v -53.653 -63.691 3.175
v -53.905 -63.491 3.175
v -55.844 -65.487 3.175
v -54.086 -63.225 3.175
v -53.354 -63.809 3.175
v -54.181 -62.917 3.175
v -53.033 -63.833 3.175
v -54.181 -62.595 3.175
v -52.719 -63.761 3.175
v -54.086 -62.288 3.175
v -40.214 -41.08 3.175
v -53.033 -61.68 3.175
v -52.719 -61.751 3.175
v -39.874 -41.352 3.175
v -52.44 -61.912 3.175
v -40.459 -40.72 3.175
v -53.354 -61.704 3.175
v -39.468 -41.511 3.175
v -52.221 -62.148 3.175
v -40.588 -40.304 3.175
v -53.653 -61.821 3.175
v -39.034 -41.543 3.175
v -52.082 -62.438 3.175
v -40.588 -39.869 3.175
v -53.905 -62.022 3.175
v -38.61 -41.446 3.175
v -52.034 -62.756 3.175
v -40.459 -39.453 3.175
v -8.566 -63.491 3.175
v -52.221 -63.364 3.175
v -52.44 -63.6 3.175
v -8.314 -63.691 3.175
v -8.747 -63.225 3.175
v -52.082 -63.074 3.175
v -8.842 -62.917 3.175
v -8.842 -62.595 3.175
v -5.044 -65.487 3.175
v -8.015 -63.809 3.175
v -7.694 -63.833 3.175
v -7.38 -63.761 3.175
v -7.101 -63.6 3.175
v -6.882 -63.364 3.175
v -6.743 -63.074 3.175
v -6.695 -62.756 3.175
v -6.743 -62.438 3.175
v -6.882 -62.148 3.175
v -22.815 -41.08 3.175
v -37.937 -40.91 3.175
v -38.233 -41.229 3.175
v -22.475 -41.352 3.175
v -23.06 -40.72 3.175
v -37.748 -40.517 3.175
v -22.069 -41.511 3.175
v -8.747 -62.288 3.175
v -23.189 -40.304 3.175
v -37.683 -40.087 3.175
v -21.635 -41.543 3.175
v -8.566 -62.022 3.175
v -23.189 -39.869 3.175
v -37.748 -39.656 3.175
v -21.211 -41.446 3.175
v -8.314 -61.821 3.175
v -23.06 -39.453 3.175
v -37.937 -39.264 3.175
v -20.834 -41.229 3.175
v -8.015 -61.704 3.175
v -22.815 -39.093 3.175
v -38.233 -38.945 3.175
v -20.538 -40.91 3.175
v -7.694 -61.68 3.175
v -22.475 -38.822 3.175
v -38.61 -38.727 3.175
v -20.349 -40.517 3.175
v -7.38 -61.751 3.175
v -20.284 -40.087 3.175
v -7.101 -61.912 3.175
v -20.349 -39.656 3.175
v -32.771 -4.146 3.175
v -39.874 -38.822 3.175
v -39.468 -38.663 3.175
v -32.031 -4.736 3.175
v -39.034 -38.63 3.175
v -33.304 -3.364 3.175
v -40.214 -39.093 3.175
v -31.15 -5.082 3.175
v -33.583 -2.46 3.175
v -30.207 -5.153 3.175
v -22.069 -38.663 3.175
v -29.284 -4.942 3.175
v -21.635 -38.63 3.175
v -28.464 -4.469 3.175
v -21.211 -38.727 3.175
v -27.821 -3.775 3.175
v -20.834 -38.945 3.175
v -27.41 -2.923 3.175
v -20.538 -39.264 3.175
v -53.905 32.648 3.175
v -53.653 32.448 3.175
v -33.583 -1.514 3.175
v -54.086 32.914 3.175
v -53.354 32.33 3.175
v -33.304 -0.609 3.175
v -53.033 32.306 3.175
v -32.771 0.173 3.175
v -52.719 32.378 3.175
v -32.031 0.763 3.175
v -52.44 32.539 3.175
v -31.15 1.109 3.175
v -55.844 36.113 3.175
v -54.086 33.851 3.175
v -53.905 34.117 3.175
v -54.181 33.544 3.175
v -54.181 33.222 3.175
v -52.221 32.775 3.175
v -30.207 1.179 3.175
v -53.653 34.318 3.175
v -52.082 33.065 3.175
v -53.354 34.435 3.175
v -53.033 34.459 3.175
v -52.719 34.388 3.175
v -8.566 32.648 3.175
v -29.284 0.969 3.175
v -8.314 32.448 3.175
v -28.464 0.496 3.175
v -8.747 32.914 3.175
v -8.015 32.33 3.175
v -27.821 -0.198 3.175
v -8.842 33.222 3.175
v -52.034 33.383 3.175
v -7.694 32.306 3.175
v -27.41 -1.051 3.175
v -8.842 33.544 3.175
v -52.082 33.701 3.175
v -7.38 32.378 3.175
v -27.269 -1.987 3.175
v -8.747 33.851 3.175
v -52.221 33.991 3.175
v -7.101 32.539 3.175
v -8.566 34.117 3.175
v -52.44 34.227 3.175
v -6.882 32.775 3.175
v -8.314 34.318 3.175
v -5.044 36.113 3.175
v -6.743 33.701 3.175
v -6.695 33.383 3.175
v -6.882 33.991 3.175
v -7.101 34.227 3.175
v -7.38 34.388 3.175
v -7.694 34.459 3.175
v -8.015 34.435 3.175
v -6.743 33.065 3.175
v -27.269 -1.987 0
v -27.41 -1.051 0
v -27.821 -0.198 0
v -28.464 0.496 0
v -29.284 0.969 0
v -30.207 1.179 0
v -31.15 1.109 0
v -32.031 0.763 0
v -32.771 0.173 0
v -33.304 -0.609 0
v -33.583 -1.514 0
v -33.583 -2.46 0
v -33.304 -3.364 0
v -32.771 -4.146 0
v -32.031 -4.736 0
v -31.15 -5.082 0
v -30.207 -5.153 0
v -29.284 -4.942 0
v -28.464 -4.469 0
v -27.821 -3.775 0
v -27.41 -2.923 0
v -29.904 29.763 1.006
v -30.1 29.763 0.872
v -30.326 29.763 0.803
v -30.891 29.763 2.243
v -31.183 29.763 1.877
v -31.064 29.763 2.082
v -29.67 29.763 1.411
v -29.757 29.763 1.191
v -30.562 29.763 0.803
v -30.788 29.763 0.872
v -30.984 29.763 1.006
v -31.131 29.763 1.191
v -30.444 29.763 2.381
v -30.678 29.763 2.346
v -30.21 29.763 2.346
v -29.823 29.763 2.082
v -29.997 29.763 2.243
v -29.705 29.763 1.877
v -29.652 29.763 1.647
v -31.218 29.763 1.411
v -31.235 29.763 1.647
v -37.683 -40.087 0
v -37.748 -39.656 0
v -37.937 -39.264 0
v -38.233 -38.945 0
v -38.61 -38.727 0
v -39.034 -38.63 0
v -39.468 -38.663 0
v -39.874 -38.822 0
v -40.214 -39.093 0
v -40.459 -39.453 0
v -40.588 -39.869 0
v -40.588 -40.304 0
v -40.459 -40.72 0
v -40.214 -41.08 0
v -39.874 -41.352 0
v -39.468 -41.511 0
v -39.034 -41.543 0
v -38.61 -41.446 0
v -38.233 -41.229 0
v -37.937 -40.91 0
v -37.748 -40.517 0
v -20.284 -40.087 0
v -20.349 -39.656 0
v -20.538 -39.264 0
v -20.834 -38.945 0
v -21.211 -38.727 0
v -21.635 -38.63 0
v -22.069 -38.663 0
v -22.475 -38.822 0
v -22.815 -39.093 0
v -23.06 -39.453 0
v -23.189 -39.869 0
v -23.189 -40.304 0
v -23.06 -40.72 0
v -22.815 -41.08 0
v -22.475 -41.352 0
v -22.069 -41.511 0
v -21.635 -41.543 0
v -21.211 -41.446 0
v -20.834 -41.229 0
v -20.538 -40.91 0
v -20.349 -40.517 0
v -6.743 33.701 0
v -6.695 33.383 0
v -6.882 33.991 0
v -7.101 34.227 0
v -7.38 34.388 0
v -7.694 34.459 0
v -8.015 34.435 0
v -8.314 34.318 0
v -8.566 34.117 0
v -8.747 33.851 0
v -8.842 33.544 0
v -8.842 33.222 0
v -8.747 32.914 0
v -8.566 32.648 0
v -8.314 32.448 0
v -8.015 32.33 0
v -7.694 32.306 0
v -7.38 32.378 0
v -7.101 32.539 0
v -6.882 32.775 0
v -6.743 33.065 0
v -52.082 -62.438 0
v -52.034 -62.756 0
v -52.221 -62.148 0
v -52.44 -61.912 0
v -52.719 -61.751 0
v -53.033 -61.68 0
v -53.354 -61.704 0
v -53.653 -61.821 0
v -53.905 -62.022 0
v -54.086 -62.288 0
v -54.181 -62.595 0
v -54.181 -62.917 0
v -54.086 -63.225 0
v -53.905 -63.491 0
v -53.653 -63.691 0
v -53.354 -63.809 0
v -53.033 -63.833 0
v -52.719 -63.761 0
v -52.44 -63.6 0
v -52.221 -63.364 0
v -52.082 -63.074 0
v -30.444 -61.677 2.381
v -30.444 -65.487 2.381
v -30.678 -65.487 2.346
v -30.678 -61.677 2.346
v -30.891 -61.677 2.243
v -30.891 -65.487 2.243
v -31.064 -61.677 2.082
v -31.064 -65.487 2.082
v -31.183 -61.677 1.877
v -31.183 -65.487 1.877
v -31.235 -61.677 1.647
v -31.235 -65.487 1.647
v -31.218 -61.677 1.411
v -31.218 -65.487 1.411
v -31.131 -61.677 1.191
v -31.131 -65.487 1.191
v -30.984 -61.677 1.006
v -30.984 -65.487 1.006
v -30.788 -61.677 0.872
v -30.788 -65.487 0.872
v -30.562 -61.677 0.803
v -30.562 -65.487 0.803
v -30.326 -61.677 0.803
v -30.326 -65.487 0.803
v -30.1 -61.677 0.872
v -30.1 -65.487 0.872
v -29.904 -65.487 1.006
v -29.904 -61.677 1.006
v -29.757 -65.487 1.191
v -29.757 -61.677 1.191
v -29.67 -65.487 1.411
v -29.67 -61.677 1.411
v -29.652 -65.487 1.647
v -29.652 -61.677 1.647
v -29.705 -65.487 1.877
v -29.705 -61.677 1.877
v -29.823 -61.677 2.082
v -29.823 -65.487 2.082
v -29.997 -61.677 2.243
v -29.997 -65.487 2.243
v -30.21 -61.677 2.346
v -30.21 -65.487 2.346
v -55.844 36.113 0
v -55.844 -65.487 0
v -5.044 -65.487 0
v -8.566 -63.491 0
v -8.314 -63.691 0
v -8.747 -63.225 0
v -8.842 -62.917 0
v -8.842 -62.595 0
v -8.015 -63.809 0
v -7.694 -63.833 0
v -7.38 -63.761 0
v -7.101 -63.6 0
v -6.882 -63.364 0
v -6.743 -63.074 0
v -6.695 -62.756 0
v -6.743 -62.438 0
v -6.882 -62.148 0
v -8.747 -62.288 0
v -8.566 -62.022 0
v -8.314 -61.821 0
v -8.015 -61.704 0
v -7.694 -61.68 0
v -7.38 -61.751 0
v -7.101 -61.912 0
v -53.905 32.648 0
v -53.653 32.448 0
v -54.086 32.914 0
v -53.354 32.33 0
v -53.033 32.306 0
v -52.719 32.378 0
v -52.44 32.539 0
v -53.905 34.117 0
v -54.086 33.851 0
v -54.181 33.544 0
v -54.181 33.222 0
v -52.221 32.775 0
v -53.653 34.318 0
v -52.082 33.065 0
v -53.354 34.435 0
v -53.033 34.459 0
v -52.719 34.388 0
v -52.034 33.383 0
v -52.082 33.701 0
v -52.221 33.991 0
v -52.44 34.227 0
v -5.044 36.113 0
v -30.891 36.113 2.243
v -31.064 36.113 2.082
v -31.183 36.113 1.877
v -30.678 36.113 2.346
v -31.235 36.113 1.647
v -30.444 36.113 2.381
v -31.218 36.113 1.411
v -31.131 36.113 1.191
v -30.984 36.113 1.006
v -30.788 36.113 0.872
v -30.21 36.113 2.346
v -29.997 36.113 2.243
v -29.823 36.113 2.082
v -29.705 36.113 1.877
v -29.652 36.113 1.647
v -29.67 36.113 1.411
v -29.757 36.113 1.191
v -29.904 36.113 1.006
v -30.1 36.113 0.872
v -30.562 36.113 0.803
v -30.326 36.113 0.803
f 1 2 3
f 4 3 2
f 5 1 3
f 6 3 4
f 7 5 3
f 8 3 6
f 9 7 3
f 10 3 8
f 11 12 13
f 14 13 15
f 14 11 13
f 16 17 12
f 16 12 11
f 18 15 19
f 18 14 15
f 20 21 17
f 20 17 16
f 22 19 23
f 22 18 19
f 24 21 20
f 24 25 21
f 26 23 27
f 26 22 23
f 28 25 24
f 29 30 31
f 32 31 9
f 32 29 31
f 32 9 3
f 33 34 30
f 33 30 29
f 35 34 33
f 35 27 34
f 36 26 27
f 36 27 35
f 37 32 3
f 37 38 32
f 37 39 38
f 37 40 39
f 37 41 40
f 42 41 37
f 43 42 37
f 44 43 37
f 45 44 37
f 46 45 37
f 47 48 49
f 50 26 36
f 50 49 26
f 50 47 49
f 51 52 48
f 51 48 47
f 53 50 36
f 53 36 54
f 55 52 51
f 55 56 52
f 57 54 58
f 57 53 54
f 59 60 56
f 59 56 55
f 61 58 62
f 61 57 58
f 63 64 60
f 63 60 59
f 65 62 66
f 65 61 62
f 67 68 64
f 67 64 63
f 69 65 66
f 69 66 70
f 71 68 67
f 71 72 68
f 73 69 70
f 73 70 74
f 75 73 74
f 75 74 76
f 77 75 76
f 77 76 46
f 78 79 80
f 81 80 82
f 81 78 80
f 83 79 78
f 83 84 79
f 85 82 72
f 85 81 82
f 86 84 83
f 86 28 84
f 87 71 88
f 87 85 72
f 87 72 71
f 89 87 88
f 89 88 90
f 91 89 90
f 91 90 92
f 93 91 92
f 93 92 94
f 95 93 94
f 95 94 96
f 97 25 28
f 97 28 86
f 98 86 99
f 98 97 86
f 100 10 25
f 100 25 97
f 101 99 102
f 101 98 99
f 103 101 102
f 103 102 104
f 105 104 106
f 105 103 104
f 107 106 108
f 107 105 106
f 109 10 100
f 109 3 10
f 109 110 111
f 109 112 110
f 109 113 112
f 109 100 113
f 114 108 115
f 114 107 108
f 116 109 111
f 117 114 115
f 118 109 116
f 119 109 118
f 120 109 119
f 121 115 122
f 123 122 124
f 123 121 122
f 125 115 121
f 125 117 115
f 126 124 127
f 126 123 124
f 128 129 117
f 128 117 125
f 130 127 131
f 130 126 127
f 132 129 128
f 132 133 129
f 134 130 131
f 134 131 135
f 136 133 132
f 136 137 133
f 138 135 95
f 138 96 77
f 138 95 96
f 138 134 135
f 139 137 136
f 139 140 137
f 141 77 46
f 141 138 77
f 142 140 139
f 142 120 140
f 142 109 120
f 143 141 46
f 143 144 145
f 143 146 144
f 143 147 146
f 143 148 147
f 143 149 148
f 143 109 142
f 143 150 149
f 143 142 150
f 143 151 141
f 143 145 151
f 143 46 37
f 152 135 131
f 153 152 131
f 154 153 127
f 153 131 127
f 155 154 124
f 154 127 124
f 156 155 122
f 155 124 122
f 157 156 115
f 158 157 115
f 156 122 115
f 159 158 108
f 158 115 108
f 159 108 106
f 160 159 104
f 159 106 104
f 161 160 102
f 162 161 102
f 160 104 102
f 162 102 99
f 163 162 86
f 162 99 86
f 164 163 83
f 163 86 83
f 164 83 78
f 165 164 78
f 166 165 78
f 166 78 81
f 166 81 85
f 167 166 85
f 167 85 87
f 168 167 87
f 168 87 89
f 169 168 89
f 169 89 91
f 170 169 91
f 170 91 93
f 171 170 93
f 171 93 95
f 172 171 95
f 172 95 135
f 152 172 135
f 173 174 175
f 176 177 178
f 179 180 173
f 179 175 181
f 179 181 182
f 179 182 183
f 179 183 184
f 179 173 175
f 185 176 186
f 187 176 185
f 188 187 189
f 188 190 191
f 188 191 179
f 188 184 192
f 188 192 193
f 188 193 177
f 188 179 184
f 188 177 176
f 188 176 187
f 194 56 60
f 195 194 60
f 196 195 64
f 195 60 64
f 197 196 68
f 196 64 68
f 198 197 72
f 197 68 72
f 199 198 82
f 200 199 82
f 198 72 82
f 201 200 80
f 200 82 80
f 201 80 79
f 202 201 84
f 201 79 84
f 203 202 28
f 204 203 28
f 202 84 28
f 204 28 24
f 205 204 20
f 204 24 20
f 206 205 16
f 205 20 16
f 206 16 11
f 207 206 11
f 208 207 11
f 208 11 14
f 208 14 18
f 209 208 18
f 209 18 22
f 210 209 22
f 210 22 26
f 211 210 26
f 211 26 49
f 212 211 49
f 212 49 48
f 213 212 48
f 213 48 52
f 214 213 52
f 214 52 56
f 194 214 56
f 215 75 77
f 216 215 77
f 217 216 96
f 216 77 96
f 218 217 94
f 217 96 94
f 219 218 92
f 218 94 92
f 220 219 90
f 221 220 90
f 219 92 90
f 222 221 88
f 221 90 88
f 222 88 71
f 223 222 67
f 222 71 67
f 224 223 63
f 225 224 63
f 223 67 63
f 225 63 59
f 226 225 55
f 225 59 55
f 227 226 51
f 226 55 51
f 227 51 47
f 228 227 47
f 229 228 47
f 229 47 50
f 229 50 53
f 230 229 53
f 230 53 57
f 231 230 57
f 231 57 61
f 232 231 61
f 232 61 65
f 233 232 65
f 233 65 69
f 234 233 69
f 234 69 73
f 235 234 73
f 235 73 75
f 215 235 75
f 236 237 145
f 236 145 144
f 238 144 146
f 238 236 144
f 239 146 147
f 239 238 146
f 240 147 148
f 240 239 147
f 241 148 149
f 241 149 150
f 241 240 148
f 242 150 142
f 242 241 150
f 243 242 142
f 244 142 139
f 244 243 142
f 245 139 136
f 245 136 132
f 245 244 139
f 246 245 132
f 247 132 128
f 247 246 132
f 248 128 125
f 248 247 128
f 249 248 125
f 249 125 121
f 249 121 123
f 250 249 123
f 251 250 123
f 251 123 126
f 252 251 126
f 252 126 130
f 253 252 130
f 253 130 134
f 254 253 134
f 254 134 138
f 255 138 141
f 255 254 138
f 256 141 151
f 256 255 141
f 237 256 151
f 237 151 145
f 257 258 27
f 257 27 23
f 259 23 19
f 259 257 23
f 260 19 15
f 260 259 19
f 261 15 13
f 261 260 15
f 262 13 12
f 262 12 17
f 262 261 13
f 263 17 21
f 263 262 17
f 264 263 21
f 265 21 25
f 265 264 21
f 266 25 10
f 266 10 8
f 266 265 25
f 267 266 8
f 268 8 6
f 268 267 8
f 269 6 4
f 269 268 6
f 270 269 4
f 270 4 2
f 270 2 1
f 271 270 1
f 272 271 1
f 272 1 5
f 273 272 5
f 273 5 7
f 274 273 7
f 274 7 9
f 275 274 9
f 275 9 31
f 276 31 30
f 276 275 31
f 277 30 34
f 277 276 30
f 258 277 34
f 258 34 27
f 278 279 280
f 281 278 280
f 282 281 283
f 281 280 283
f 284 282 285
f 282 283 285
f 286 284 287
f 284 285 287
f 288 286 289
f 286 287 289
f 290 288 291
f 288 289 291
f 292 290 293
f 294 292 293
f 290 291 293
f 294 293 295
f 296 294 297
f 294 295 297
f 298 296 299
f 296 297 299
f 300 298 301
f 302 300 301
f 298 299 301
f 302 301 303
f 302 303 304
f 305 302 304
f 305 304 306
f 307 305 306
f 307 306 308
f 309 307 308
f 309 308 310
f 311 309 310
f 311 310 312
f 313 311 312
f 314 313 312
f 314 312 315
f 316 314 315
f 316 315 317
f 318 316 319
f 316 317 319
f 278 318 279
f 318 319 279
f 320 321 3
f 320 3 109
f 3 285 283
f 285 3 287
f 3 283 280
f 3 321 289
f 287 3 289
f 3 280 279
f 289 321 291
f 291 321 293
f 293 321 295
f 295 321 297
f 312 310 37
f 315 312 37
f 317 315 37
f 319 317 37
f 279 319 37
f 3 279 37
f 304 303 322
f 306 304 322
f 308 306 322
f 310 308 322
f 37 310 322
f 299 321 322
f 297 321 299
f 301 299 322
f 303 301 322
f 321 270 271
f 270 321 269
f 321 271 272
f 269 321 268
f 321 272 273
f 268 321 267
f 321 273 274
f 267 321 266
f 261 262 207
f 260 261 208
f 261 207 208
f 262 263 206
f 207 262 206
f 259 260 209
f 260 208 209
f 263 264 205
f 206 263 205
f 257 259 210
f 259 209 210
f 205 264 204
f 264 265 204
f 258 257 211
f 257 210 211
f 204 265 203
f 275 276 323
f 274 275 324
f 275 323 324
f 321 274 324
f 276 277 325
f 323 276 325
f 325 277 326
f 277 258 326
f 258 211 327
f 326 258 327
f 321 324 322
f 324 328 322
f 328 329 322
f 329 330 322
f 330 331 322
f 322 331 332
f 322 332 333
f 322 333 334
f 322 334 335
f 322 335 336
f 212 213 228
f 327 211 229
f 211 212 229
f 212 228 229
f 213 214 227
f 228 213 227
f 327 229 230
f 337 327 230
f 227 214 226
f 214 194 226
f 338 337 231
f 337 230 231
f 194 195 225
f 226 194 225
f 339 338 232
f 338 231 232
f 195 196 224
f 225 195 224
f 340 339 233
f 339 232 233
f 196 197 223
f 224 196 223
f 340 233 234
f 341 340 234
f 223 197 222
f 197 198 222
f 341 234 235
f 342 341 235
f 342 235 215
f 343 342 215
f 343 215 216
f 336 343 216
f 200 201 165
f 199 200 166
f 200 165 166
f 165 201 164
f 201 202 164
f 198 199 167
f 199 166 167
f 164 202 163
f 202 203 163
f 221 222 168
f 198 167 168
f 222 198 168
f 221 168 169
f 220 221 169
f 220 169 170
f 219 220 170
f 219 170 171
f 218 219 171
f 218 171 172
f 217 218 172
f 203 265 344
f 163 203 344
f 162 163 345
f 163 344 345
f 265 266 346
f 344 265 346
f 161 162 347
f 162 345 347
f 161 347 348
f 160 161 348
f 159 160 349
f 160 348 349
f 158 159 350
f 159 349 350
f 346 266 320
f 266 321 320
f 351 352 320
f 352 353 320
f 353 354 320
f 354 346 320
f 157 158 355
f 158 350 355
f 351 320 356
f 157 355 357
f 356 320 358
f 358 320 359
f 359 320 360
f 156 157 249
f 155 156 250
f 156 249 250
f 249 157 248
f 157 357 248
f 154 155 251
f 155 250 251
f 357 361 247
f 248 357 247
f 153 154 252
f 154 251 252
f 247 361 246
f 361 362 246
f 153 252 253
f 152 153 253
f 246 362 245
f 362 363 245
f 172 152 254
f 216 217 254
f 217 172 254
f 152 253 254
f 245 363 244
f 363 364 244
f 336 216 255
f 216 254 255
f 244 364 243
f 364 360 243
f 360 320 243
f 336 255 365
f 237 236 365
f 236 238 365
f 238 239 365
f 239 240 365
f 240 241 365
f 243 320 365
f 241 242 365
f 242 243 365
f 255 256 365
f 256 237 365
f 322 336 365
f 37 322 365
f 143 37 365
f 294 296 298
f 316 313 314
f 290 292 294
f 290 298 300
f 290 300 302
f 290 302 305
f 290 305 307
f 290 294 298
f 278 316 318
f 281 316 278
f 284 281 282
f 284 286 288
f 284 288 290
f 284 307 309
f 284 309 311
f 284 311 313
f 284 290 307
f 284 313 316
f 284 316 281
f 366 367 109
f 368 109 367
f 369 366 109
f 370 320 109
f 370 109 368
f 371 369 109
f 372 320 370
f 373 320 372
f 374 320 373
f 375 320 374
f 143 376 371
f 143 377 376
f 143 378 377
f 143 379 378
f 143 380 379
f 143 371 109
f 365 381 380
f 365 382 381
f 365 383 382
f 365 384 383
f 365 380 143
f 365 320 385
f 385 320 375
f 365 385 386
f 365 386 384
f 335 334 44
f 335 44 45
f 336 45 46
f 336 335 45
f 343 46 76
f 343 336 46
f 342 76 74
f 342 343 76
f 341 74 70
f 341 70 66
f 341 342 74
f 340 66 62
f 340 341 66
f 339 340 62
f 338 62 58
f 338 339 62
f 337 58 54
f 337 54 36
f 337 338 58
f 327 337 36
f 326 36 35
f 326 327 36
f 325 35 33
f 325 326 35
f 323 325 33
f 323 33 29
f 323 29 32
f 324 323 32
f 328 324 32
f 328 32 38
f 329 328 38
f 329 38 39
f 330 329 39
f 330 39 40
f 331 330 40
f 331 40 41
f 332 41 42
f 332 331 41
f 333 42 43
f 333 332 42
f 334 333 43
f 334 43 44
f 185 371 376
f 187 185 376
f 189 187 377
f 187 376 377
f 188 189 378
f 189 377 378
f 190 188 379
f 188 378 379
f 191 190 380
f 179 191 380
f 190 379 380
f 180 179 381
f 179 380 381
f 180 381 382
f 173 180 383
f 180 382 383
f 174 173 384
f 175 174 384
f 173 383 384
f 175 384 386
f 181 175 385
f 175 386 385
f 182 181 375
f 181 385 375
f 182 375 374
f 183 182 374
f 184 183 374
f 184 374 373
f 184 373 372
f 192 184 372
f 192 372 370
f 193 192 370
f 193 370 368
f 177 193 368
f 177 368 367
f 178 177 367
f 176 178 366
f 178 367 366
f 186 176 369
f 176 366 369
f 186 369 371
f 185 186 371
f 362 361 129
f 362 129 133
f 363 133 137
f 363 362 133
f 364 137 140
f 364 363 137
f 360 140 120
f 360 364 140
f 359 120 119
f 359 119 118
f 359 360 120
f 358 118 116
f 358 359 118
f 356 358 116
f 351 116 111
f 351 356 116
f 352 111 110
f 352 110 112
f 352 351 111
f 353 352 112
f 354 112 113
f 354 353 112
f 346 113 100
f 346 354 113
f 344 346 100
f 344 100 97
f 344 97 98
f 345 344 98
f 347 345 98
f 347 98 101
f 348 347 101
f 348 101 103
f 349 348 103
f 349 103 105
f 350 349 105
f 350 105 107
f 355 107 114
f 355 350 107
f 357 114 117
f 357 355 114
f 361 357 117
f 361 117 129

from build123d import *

# Parameters (mm, degrees)
SKETCH1_W           = 50.8
SKETCH1_H           = 101.6
SKETCH1_R           = 1.0795
BOSS_EXTRUDE1_DEPTH = 3.175
SKETCH3_R           = 0.79375
CUT_EXTRUDE1_DEPTH  = 6.35
SKETCH4_R           = 0.79375
CUT_EXTRUDE2_DEPTH  = 3.81
SKETCH5_R           = 3.175
CUT_EXTRUDE3_DEPTH  = 4.175
SKETCH6_R           = 1.4605
CUT_EXTRUDE4_DEPTH  = 4.175


with BuildPart() as part:
    # Sketch1 → Boss-Extrude1 (new body)
    with BuildSketch(Plane.XY):
        with Locations((-30.443913465, -14.686809816)):
            Rectangle(SKETCH1_W, SKETCH1_H)
        with Locations((-53.113413465, 33.382690184)):
            Circle(SKETCH1_R, mode=Mode.SUBTRACT)
        with Locations((-53.113413465, -62.756309816)):
            Circle(SKETCH1_R, mode=Mode.SUBTRACT)
        with Locations((-7.774413465, -62.756309816)):
            Circle(SKETCH1_R, mode=Mode.SUBTRACT)
        with Locations((-7.774413465, 33.382690184)):
            Circle(SKETCH1_R, mode=Mode.SUBTRACT)
    extrude(amount=BOSS_EXTRUDE1_DEPTH)

    # Sketch3 → Cut-Extrude1 (cut)
    with BuildSketch(Plane(origin=(0, 36.113190184, 0), x_dir=(1, 0, 0), z_dir=(0, 1, 0))):
        with Locations(Location((-30.443913465, -1.5875, 0), (0, 0, 270))):  # turned: the seam where the file's is
            Circle(SKETCH3_R)
    extrude(amount=-CUT_EXTRUDE1_DEPTH, mode=Mode.SUBTRACT)

    # Sketch4 → Cut-Extrude2 (cut)
    with BuildSketch(Plane(origin=(0, -65.486809816, 0), x_dir=(-1, 0, 0), z_dir=(0, -1, 0))):
        with Locations(Location((30.443913465, -1.5875, 0), (0, 0, 270))):  # turned: the seam where the file's is
            Circle(SKETCH4_R)
    extrude(amount=-CUT_EXTRUDE2_DEPTH, mode=Mode.SUBTRACT)

    # Sketch5 → Cut-Extrude3 (cut, through all)
    with BuildSketch(Plane.XY.offset(3.175)):
        with Locations((-30.443913465, -1.986809816)):
            Circle(SKETCH5_R)
    extrude(amount=-CUT_EXTRUDE3_DEPTH, mode=Mode.SUBTRACT)

    # Sketch6 → Cut-Extrude4 (cut, through all)
    with BuildSketch(Plane.XY.offset(3.175)):
        with Locations((-39.143413465, -40.086809816)):
            Circle(SKETCH6_R)
        with Locations((-21.744413465, -40.086809816)):
            Circle(SKETCH6_R)
    extrude(amount=-CUT_EXTRUDE4_DEPTH, mode=Mode.SUBTRACT)


solid = part.part
